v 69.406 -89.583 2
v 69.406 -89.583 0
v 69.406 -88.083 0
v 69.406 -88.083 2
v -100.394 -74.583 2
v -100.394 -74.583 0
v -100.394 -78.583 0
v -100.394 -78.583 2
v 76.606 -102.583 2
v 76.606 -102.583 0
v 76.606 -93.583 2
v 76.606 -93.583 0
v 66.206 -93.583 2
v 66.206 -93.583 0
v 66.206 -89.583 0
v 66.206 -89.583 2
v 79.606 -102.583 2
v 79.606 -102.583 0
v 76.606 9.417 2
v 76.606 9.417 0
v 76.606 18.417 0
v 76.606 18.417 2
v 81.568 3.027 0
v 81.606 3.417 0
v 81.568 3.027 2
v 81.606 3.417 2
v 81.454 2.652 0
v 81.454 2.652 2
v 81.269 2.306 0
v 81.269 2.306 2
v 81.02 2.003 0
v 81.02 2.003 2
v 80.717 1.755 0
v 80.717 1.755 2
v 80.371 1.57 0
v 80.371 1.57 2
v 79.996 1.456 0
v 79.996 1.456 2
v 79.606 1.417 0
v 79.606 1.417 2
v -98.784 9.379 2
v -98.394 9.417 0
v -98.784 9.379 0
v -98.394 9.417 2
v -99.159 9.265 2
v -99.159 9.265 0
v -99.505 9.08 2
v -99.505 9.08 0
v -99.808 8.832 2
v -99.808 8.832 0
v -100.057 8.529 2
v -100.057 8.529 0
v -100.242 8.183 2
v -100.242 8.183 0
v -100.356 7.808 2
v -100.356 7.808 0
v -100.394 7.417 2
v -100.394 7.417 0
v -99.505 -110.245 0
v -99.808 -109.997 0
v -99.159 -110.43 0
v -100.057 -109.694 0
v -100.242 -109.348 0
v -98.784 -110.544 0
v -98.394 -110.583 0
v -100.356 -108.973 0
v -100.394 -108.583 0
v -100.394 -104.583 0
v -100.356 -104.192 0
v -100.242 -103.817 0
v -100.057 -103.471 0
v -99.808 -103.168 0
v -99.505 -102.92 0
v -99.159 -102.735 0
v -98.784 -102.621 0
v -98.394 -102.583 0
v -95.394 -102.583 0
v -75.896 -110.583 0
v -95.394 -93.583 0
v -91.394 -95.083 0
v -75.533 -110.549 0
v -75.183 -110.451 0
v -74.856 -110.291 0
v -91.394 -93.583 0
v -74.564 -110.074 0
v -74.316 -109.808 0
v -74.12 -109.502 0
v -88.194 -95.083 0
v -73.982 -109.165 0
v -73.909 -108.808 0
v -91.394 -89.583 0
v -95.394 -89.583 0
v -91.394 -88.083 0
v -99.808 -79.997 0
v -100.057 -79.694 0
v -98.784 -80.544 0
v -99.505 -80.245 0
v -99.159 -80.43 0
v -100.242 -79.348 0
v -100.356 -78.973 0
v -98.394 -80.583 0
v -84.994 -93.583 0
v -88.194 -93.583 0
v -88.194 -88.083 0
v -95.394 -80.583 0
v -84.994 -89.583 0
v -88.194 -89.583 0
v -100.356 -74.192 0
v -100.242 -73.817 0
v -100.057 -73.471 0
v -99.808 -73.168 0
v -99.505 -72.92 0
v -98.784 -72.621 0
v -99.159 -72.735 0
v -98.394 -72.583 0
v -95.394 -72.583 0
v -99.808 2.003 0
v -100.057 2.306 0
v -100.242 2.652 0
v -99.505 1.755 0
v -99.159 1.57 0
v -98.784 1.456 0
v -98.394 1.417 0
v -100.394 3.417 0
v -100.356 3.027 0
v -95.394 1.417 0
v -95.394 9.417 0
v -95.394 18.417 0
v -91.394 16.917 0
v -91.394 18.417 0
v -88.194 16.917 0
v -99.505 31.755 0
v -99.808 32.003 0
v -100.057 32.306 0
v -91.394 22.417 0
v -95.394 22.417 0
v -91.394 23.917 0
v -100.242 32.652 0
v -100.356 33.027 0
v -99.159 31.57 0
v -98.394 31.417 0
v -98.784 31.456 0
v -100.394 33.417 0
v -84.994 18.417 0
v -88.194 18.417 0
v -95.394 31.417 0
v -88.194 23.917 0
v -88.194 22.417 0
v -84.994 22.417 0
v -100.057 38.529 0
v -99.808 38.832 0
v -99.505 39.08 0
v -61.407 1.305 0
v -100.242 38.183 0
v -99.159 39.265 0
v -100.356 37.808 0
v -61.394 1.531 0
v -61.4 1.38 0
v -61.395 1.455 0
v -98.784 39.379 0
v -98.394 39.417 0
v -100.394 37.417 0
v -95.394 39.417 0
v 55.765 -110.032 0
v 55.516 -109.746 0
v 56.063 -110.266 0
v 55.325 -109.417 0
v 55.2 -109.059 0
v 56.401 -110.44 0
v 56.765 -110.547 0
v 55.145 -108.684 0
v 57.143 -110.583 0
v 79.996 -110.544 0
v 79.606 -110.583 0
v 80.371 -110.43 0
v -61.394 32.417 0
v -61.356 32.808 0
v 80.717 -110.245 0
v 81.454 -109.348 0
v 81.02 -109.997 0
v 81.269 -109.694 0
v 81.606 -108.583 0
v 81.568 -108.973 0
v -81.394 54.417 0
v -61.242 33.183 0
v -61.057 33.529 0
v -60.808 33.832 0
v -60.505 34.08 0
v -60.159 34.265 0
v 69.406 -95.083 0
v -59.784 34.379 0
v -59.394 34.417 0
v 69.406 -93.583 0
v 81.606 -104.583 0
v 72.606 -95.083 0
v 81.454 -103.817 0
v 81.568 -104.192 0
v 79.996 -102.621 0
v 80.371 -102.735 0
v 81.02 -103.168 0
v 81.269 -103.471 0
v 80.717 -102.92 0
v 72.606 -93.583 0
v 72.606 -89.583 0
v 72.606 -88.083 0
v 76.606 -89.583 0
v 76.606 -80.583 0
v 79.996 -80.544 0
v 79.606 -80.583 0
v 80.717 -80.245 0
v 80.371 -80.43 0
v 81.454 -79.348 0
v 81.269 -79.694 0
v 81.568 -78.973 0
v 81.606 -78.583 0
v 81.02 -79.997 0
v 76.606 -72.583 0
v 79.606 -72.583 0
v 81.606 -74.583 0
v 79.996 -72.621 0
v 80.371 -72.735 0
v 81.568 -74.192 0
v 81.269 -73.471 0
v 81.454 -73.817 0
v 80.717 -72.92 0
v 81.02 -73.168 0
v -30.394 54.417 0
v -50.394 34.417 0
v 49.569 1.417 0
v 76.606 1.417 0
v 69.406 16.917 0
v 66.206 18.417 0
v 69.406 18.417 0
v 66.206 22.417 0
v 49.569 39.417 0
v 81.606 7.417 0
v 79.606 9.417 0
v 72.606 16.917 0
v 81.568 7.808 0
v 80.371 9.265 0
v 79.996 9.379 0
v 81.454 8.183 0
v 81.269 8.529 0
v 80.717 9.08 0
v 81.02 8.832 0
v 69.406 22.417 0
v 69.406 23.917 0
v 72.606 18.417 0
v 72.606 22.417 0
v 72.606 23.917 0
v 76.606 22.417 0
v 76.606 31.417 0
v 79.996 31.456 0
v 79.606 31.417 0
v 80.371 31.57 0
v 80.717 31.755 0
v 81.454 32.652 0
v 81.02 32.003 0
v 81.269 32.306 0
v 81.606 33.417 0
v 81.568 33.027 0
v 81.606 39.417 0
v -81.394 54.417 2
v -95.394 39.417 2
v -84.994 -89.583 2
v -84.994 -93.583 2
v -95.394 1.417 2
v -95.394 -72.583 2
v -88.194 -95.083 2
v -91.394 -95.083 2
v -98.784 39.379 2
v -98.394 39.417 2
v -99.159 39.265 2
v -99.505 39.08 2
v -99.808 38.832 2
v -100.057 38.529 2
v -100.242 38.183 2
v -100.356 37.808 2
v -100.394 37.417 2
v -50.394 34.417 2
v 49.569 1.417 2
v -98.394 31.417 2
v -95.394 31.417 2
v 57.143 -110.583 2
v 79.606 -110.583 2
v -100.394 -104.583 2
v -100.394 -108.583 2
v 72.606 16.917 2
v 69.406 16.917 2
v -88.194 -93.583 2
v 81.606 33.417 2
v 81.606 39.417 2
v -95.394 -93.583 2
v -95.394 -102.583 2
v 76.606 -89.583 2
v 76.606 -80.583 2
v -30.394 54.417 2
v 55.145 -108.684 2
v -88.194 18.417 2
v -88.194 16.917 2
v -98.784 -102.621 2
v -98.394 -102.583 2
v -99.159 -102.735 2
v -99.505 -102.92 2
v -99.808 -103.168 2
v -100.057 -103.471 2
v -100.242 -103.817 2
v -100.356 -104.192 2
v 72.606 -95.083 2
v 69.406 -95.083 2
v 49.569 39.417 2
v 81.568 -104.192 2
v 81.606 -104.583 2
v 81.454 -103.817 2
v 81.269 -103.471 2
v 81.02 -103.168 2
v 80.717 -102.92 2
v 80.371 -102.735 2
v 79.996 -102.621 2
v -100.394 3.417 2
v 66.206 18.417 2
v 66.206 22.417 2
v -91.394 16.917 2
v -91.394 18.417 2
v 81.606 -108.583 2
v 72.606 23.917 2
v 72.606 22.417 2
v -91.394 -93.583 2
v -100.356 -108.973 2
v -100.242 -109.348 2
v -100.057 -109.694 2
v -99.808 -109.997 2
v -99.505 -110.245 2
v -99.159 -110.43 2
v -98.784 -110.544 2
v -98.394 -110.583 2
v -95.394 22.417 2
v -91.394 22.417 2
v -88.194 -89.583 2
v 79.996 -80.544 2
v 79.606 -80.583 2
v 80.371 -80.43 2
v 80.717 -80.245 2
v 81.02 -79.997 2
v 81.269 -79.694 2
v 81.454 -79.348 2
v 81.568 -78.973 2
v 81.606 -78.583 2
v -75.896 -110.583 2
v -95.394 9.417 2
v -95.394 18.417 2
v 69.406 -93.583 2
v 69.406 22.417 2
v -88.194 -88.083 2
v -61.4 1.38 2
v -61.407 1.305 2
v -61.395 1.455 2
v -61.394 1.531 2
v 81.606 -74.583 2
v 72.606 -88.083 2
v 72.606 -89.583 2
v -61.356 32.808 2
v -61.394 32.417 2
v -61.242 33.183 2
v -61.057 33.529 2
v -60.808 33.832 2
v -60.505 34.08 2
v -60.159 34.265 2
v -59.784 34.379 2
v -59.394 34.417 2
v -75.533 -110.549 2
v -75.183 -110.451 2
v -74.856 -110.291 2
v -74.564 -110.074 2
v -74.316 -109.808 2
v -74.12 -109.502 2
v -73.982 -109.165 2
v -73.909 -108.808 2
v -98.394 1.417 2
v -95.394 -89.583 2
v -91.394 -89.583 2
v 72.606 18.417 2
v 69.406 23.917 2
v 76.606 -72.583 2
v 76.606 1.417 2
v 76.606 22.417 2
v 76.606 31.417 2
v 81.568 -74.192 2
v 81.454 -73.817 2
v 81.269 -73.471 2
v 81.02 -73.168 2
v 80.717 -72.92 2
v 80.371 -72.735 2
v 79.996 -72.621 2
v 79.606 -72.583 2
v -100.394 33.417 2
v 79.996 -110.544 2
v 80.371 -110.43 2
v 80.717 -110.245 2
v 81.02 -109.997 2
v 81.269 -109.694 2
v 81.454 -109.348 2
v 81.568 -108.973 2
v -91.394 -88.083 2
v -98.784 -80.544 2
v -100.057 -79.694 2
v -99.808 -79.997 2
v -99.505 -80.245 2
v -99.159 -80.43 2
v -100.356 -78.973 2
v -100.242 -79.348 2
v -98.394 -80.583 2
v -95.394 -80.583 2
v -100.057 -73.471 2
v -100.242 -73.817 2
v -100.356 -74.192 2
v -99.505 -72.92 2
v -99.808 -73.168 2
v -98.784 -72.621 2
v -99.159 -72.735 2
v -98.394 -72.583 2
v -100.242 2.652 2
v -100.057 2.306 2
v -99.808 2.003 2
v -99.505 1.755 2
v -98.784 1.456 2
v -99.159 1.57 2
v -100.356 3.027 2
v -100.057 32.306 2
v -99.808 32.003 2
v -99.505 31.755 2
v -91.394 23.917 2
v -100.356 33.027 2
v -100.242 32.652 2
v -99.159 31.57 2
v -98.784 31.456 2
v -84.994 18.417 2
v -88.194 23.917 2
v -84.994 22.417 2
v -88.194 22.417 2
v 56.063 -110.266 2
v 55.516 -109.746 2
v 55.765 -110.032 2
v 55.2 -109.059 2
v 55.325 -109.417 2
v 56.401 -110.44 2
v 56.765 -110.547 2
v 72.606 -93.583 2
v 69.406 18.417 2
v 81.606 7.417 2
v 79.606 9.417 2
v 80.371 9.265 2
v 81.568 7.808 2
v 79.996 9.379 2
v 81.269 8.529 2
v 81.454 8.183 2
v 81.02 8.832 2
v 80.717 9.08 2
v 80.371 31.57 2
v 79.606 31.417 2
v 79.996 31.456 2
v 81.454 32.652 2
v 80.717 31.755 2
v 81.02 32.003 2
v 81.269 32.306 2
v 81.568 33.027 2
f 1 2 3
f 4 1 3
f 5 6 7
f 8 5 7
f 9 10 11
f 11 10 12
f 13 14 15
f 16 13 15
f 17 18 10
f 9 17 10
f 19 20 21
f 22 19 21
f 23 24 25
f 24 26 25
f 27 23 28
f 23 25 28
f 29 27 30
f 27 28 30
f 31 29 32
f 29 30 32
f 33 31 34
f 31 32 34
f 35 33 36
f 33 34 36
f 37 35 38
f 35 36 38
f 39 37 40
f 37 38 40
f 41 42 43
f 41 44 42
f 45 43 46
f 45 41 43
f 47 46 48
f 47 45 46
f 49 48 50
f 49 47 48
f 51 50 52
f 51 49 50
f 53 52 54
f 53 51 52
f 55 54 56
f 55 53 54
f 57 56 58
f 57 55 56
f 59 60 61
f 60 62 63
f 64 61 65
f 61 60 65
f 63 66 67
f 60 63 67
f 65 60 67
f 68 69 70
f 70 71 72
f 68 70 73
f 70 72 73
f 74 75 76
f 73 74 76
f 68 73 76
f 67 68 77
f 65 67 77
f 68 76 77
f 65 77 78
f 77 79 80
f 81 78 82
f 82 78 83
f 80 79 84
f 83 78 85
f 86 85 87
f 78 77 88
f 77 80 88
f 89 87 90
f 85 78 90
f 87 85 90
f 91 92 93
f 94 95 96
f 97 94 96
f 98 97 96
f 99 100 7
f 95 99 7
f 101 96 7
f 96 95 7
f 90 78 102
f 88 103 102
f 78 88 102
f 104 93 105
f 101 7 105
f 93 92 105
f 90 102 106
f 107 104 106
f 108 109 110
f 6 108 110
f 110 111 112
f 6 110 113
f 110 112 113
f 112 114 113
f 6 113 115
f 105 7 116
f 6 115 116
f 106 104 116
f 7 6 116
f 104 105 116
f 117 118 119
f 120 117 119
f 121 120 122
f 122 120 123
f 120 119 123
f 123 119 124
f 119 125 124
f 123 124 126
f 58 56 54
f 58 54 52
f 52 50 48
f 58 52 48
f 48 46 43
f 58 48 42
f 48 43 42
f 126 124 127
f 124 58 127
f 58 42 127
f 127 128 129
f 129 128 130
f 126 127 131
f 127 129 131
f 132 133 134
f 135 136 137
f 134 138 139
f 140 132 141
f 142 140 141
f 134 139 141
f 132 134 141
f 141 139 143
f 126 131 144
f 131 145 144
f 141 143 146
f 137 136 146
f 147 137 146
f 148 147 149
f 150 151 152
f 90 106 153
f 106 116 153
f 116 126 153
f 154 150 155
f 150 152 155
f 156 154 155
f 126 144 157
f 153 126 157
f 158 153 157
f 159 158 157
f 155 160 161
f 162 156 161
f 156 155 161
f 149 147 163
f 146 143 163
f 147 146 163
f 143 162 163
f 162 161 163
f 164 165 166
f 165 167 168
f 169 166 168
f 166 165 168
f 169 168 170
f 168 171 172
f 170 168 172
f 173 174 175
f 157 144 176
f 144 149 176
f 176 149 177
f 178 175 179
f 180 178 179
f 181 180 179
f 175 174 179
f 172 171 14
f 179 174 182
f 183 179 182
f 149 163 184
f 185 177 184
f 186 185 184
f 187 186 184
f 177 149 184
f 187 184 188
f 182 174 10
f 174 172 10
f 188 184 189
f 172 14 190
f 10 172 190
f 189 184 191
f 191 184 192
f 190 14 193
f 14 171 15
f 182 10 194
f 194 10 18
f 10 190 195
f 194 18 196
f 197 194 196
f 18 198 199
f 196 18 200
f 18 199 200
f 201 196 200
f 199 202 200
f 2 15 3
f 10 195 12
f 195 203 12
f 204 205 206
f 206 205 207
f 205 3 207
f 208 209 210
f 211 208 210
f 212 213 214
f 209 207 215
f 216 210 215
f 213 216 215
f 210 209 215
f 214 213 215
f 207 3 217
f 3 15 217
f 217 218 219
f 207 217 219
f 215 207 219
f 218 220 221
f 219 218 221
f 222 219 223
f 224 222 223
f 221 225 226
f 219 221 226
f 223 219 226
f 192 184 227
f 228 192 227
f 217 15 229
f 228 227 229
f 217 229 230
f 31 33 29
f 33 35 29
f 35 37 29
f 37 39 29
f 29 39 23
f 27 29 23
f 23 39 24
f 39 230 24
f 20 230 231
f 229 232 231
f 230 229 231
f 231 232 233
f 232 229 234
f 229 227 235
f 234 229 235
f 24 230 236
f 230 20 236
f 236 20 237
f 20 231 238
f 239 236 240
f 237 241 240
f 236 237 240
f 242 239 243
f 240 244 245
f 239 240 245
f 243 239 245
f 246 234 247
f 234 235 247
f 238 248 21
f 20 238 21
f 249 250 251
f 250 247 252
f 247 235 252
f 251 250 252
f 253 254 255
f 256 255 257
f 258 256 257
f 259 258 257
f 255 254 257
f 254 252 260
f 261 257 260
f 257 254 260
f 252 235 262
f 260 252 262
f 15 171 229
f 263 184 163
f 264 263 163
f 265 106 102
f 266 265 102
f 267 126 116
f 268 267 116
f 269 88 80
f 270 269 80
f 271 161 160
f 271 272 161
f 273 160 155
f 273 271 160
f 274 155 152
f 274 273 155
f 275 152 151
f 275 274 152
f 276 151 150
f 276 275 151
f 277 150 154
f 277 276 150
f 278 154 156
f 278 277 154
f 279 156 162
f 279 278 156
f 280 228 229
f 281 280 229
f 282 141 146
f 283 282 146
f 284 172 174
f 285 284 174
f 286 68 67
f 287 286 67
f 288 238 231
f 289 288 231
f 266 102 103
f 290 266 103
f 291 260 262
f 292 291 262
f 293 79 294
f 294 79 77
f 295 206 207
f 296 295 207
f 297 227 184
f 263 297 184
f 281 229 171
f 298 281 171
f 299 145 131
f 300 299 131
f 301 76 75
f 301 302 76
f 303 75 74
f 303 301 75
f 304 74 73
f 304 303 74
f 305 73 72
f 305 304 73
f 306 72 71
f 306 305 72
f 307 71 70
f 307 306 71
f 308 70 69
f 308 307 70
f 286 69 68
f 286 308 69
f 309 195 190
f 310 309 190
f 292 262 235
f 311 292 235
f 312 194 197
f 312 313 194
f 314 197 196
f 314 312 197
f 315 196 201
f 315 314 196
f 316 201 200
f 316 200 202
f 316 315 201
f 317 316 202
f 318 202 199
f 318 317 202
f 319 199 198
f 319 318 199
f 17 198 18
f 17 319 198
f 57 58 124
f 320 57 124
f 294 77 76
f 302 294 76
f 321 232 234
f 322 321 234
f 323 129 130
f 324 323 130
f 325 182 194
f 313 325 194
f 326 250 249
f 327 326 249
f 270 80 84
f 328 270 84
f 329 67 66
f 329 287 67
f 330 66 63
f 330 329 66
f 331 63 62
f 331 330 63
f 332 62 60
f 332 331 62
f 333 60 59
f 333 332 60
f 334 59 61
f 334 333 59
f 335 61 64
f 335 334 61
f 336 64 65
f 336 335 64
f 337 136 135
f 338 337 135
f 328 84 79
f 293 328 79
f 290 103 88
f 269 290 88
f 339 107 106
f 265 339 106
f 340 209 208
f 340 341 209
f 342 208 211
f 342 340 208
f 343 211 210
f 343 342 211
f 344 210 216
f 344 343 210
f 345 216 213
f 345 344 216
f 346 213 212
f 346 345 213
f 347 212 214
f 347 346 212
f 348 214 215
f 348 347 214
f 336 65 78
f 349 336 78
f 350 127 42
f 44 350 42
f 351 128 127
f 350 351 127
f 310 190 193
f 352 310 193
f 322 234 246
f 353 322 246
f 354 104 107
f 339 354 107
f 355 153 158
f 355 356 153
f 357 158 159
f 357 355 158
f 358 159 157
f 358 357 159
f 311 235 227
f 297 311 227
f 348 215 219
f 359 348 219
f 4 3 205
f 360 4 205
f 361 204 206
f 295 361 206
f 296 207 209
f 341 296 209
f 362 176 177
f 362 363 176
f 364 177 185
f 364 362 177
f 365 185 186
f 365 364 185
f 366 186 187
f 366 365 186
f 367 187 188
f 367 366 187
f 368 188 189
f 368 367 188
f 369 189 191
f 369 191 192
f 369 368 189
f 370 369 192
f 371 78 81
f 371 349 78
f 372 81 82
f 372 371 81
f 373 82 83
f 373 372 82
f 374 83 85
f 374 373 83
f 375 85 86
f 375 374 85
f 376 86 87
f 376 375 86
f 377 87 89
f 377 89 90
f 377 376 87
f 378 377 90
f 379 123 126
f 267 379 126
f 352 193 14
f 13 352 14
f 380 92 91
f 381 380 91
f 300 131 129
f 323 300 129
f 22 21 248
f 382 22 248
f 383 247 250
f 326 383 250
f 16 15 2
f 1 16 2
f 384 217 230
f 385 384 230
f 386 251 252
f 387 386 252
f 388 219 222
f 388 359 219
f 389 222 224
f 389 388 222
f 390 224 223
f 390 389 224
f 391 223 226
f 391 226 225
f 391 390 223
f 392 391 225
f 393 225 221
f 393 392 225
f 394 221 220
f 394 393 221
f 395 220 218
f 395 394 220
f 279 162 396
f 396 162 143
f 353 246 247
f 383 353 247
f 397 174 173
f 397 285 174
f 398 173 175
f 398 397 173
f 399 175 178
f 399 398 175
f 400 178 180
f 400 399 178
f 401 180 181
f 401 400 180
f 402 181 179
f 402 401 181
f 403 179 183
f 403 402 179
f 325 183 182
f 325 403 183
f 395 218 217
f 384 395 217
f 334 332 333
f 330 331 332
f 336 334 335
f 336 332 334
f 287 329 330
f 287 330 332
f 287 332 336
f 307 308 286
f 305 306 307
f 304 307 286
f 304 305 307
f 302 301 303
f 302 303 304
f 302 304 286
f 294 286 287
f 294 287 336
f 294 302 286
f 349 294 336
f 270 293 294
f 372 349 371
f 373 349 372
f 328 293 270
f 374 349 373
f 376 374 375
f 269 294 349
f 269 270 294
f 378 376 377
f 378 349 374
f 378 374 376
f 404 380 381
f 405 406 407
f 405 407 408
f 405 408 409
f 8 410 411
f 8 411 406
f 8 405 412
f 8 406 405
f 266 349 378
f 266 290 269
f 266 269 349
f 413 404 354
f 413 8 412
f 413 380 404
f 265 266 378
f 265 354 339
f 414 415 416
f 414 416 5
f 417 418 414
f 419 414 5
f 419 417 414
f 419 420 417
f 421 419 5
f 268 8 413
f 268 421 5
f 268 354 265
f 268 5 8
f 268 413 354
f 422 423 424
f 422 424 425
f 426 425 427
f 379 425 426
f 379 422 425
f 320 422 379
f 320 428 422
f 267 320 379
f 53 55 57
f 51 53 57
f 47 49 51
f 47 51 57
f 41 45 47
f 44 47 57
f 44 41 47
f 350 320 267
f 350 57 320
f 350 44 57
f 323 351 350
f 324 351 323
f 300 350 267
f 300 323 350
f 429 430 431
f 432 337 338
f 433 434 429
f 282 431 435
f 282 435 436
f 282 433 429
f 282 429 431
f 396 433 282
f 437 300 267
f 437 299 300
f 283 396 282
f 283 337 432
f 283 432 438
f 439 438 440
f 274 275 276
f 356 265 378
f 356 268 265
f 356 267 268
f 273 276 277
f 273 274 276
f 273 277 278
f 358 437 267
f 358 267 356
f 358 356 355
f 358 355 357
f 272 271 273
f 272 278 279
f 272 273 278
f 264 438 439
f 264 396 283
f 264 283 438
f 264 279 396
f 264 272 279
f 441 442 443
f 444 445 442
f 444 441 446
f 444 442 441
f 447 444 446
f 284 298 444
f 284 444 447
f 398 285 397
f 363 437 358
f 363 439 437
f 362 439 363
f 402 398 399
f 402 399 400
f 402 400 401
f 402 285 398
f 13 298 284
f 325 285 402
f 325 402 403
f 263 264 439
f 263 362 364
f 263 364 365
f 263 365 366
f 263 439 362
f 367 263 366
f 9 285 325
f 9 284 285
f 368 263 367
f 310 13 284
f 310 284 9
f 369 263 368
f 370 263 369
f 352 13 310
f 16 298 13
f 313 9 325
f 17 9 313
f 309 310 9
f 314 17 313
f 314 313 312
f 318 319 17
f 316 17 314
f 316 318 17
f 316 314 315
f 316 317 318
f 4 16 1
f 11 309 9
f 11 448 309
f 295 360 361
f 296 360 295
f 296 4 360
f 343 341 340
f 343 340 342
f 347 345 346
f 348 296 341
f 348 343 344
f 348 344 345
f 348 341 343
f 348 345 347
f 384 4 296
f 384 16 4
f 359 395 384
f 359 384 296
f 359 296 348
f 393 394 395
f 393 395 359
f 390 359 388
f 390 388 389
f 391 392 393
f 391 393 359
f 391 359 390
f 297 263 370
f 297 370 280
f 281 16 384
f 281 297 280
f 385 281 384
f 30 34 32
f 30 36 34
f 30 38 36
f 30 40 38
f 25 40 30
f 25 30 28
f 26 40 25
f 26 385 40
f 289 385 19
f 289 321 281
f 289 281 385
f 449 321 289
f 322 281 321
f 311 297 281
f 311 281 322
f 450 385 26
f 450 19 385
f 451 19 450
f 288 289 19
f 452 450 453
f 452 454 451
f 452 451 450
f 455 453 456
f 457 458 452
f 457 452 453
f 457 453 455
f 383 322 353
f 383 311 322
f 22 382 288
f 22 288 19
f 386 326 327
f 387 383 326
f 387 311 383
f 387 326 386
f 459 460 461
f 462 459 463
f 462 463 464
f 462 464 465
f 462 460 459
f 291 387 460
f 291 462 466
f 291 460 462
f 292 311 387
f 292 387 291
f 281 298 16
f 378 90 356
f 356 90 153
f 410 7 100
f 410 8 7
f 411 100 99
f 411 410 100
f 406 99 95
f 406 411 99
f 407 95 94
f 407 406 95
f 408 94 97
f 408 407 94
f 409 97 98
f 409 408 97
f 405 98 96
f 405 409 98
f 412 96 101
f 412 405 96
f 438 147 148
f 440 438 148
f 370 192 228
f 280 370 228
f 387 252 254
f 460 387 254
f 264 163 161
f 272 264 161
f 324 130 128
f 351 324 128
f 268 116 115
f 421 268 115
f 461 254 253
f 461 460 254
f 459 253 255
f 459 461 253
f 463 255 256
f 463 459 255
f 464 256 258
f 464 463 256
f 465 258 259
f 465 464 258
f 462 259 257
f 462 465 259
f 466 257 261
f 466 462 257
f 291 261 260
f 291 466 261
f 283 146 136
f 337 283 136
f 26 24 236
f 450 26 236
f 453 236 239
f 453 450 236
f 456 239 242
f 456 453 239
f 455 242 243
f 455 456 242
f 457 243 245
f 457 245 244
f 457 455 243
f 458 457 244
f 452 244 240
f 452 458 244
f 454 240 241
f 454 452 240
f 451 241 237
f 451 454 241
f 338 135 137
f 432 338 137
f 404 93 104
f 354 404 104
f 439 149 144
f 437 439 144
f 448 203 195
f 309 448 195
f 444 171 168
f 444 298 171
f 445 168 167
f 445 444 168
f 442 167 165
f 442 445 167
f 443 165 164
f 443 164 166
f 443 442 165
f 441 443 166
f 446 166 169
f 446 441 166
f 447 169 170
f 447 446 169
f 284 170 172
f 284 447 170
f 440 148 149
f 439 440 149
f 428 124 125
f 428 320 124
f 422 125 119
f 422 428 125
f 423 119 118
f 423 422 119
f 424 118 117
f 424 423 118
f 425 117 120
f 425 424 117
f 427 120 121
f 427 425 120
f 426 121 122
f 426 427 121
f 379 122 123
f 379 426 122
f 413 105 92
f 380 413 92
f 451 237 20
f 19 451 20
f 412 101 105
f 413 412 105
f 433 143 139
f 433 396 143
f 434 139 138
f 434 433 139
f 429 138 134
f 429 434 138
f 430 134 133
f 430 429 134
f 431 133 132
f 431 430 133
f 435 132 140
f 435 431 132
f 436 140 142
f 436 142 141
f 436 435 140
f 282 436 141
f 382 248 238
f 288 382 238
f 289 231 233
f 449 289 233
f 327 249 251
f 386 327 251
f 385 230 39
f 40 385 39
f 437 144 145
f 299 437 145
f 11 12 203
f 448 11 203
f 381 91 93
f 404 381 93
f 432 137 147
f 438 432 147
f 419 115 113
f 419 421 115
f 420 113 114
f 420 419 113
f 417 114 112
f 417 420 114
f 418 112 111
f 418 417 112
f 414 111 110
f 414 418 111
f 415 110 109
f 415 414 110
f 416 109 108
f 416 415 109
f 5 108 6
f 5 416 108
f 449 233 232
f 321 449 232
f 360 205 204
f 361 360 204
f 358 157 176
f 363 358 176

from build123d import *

# Parameters (mm, degrees)
EXTRUDE_1_DEPTH = 2
FILLET_1_R      = 2


with BuildPart() as part:
    # 草图1 → 凸台-拉伸1 (new body)
    with BuildSketch(Plane.XY):
        Polygon((81.606020908, 1.417469639), (81.606020908, 9.417469639), (76.606020908, 9.417469639), (76.606020908, 18.417469797), (72.606020908, 18.417469797), (72.606020908, 16.917469797), (69.406020908, 16.917469797), (69.406020908, 18.417469797), (66.206020908, 18.417469797), (66.206020908, 22.417469797), (69.406020908, 22.417469797), (69.406020908, 23.917469797), (72.606020908, 23.917469797), (72.606020908, 22.417469797), (76.606020908, 22.417469797), (76.606020908, 31.417469956), (81.606020908, 31.417469956), (81.606020908, 39.417469956), (76.606020908, 39.417469956), (49.568659109, 39.417469956), (-30.393979092, 54.417469639), (-81.393979092, 54.417469639), (-95.393979092, 39.417469956), (-100.393979092, 39.417469956), (-100.393979092, 31.417469956), (-95.393979092, 31.417469956), (-95.393979092, 22.417469797), (-91.393979092, 22.417469797), (-91.393979092, 23.917469797), (-88.193979092, 23.917469797), (-88.193979092, 22.417469797), (-84.993979092, 22.417469797), (-84.993979092, 18.417469797), (-88.193979092, 18.417469797), (-88.193979092, 16.917469797), (-91.393979092, 16.917469797), (-91.393979092, 18.417469797), (-95.393979092, 18.417469797), (-95.393979092, 9.417469639), (-100.393979092, 9.417469639), (-100.393979092, 1.417469639), (-95.393979092, 1.417469639), (-95.393979092, -72.582530044), (-100.393979092, -72.582530044), (-100.393979092, -80.582530044), (-95.393979092, -80.582530044), (-95.393979092, -89.582530203), (-91.393979092, -89.582530203), (-91.393979092, -88.082530203), (-88.193979092, -88.082530203), (-88.193979092, -89.582530203), (-84.993979092, -89.582530203), (-84.993979092, -93.582530203), (-88.193979092, -93.582530203), (-88.193979092, -95.082530203), (-91.393979092, -95.082530203), (-91.393979092, -93.582530203), (-95.393979092, -93.582530203), (-95.393979092, -102.582530361), (-100.393979092, -102.582530361), (-100.393979092, -110.582530361), (-95.393979092, -110.582530361), (-74.110124615, -110.582530361), (-61.393979092, 1.417469639), (-61.393979092, 34.417469639), (-50.393979092, 34.417469639), (49.568659109, 1.417469639), (55.241335591, -110.582530361), (76.606020908, -110.582530361), (81.606020908, -110.582530361), (81.606020908, -102.582530361), (76.606020908, -102.582530361), (76.606020908, -93.582530203), (72.606020908, -93.582530203), (72.606020908, -95.082530203), (69.406020908, -95.082530203), (69.406020908, -93.582530203), (66.206020908, -93.582530203), (66.206020908, -89.582530203), (69.406020908, -89.582530203), (69.406020908, -88.082530203), (72.606020908, -88.082530203), (72.606020908, -89.582530203), (76.606020908, -89.582530203), (76.606020908, -80.582530044), (81.606020908, -80.582530044), (81.606020908, -72.582530044), (76.606020908, -72.582530044), (76.606020908, 1.417469639), align=None)
    extrude(amount=EXTRUDE_1_DEPTH)

    # 圆角1
    fillet_1_edges = [part.edges().sort_by_distance(p)[0] for p in [
        (81.606020908, -102.582530361, 1),
        (81.606020908, -110.582530361, 1),
        (55.241335591, -110.582530361, 1),
        (-61.393979092, 34.417469639, 1),
        (-61.393979092, 1.417469639, 1),
        (-74.110124615, -110.582530361, 1),
        (-100.393979092, -110.582530361, 1),
        (-100.393979092, -102.582530361, 1),
        (-100.393979092, -80.582530044, 1),
        (-100.393979092, -72.582530044, 1),
        (-100.393979092, 1.417469639, 1),
        (-100.393979092, 9.417469639, 1),
        (-100.393979092, 31.417469956, 1),
        (-100.393979092, 39.417469956, 1),
        (81.606020908, 31.417469956, 1),
        (81.606020908, 9.417469639, 1),
        (81.606020908, 1.417469639, 1),
        (81.606020908, -72.582530044, 1),
        (81.606020908, -80.582530044, 1),
    ]]
    fillet(fillet_1_edges, radius=FILLET_1_R)


solid = part.part
